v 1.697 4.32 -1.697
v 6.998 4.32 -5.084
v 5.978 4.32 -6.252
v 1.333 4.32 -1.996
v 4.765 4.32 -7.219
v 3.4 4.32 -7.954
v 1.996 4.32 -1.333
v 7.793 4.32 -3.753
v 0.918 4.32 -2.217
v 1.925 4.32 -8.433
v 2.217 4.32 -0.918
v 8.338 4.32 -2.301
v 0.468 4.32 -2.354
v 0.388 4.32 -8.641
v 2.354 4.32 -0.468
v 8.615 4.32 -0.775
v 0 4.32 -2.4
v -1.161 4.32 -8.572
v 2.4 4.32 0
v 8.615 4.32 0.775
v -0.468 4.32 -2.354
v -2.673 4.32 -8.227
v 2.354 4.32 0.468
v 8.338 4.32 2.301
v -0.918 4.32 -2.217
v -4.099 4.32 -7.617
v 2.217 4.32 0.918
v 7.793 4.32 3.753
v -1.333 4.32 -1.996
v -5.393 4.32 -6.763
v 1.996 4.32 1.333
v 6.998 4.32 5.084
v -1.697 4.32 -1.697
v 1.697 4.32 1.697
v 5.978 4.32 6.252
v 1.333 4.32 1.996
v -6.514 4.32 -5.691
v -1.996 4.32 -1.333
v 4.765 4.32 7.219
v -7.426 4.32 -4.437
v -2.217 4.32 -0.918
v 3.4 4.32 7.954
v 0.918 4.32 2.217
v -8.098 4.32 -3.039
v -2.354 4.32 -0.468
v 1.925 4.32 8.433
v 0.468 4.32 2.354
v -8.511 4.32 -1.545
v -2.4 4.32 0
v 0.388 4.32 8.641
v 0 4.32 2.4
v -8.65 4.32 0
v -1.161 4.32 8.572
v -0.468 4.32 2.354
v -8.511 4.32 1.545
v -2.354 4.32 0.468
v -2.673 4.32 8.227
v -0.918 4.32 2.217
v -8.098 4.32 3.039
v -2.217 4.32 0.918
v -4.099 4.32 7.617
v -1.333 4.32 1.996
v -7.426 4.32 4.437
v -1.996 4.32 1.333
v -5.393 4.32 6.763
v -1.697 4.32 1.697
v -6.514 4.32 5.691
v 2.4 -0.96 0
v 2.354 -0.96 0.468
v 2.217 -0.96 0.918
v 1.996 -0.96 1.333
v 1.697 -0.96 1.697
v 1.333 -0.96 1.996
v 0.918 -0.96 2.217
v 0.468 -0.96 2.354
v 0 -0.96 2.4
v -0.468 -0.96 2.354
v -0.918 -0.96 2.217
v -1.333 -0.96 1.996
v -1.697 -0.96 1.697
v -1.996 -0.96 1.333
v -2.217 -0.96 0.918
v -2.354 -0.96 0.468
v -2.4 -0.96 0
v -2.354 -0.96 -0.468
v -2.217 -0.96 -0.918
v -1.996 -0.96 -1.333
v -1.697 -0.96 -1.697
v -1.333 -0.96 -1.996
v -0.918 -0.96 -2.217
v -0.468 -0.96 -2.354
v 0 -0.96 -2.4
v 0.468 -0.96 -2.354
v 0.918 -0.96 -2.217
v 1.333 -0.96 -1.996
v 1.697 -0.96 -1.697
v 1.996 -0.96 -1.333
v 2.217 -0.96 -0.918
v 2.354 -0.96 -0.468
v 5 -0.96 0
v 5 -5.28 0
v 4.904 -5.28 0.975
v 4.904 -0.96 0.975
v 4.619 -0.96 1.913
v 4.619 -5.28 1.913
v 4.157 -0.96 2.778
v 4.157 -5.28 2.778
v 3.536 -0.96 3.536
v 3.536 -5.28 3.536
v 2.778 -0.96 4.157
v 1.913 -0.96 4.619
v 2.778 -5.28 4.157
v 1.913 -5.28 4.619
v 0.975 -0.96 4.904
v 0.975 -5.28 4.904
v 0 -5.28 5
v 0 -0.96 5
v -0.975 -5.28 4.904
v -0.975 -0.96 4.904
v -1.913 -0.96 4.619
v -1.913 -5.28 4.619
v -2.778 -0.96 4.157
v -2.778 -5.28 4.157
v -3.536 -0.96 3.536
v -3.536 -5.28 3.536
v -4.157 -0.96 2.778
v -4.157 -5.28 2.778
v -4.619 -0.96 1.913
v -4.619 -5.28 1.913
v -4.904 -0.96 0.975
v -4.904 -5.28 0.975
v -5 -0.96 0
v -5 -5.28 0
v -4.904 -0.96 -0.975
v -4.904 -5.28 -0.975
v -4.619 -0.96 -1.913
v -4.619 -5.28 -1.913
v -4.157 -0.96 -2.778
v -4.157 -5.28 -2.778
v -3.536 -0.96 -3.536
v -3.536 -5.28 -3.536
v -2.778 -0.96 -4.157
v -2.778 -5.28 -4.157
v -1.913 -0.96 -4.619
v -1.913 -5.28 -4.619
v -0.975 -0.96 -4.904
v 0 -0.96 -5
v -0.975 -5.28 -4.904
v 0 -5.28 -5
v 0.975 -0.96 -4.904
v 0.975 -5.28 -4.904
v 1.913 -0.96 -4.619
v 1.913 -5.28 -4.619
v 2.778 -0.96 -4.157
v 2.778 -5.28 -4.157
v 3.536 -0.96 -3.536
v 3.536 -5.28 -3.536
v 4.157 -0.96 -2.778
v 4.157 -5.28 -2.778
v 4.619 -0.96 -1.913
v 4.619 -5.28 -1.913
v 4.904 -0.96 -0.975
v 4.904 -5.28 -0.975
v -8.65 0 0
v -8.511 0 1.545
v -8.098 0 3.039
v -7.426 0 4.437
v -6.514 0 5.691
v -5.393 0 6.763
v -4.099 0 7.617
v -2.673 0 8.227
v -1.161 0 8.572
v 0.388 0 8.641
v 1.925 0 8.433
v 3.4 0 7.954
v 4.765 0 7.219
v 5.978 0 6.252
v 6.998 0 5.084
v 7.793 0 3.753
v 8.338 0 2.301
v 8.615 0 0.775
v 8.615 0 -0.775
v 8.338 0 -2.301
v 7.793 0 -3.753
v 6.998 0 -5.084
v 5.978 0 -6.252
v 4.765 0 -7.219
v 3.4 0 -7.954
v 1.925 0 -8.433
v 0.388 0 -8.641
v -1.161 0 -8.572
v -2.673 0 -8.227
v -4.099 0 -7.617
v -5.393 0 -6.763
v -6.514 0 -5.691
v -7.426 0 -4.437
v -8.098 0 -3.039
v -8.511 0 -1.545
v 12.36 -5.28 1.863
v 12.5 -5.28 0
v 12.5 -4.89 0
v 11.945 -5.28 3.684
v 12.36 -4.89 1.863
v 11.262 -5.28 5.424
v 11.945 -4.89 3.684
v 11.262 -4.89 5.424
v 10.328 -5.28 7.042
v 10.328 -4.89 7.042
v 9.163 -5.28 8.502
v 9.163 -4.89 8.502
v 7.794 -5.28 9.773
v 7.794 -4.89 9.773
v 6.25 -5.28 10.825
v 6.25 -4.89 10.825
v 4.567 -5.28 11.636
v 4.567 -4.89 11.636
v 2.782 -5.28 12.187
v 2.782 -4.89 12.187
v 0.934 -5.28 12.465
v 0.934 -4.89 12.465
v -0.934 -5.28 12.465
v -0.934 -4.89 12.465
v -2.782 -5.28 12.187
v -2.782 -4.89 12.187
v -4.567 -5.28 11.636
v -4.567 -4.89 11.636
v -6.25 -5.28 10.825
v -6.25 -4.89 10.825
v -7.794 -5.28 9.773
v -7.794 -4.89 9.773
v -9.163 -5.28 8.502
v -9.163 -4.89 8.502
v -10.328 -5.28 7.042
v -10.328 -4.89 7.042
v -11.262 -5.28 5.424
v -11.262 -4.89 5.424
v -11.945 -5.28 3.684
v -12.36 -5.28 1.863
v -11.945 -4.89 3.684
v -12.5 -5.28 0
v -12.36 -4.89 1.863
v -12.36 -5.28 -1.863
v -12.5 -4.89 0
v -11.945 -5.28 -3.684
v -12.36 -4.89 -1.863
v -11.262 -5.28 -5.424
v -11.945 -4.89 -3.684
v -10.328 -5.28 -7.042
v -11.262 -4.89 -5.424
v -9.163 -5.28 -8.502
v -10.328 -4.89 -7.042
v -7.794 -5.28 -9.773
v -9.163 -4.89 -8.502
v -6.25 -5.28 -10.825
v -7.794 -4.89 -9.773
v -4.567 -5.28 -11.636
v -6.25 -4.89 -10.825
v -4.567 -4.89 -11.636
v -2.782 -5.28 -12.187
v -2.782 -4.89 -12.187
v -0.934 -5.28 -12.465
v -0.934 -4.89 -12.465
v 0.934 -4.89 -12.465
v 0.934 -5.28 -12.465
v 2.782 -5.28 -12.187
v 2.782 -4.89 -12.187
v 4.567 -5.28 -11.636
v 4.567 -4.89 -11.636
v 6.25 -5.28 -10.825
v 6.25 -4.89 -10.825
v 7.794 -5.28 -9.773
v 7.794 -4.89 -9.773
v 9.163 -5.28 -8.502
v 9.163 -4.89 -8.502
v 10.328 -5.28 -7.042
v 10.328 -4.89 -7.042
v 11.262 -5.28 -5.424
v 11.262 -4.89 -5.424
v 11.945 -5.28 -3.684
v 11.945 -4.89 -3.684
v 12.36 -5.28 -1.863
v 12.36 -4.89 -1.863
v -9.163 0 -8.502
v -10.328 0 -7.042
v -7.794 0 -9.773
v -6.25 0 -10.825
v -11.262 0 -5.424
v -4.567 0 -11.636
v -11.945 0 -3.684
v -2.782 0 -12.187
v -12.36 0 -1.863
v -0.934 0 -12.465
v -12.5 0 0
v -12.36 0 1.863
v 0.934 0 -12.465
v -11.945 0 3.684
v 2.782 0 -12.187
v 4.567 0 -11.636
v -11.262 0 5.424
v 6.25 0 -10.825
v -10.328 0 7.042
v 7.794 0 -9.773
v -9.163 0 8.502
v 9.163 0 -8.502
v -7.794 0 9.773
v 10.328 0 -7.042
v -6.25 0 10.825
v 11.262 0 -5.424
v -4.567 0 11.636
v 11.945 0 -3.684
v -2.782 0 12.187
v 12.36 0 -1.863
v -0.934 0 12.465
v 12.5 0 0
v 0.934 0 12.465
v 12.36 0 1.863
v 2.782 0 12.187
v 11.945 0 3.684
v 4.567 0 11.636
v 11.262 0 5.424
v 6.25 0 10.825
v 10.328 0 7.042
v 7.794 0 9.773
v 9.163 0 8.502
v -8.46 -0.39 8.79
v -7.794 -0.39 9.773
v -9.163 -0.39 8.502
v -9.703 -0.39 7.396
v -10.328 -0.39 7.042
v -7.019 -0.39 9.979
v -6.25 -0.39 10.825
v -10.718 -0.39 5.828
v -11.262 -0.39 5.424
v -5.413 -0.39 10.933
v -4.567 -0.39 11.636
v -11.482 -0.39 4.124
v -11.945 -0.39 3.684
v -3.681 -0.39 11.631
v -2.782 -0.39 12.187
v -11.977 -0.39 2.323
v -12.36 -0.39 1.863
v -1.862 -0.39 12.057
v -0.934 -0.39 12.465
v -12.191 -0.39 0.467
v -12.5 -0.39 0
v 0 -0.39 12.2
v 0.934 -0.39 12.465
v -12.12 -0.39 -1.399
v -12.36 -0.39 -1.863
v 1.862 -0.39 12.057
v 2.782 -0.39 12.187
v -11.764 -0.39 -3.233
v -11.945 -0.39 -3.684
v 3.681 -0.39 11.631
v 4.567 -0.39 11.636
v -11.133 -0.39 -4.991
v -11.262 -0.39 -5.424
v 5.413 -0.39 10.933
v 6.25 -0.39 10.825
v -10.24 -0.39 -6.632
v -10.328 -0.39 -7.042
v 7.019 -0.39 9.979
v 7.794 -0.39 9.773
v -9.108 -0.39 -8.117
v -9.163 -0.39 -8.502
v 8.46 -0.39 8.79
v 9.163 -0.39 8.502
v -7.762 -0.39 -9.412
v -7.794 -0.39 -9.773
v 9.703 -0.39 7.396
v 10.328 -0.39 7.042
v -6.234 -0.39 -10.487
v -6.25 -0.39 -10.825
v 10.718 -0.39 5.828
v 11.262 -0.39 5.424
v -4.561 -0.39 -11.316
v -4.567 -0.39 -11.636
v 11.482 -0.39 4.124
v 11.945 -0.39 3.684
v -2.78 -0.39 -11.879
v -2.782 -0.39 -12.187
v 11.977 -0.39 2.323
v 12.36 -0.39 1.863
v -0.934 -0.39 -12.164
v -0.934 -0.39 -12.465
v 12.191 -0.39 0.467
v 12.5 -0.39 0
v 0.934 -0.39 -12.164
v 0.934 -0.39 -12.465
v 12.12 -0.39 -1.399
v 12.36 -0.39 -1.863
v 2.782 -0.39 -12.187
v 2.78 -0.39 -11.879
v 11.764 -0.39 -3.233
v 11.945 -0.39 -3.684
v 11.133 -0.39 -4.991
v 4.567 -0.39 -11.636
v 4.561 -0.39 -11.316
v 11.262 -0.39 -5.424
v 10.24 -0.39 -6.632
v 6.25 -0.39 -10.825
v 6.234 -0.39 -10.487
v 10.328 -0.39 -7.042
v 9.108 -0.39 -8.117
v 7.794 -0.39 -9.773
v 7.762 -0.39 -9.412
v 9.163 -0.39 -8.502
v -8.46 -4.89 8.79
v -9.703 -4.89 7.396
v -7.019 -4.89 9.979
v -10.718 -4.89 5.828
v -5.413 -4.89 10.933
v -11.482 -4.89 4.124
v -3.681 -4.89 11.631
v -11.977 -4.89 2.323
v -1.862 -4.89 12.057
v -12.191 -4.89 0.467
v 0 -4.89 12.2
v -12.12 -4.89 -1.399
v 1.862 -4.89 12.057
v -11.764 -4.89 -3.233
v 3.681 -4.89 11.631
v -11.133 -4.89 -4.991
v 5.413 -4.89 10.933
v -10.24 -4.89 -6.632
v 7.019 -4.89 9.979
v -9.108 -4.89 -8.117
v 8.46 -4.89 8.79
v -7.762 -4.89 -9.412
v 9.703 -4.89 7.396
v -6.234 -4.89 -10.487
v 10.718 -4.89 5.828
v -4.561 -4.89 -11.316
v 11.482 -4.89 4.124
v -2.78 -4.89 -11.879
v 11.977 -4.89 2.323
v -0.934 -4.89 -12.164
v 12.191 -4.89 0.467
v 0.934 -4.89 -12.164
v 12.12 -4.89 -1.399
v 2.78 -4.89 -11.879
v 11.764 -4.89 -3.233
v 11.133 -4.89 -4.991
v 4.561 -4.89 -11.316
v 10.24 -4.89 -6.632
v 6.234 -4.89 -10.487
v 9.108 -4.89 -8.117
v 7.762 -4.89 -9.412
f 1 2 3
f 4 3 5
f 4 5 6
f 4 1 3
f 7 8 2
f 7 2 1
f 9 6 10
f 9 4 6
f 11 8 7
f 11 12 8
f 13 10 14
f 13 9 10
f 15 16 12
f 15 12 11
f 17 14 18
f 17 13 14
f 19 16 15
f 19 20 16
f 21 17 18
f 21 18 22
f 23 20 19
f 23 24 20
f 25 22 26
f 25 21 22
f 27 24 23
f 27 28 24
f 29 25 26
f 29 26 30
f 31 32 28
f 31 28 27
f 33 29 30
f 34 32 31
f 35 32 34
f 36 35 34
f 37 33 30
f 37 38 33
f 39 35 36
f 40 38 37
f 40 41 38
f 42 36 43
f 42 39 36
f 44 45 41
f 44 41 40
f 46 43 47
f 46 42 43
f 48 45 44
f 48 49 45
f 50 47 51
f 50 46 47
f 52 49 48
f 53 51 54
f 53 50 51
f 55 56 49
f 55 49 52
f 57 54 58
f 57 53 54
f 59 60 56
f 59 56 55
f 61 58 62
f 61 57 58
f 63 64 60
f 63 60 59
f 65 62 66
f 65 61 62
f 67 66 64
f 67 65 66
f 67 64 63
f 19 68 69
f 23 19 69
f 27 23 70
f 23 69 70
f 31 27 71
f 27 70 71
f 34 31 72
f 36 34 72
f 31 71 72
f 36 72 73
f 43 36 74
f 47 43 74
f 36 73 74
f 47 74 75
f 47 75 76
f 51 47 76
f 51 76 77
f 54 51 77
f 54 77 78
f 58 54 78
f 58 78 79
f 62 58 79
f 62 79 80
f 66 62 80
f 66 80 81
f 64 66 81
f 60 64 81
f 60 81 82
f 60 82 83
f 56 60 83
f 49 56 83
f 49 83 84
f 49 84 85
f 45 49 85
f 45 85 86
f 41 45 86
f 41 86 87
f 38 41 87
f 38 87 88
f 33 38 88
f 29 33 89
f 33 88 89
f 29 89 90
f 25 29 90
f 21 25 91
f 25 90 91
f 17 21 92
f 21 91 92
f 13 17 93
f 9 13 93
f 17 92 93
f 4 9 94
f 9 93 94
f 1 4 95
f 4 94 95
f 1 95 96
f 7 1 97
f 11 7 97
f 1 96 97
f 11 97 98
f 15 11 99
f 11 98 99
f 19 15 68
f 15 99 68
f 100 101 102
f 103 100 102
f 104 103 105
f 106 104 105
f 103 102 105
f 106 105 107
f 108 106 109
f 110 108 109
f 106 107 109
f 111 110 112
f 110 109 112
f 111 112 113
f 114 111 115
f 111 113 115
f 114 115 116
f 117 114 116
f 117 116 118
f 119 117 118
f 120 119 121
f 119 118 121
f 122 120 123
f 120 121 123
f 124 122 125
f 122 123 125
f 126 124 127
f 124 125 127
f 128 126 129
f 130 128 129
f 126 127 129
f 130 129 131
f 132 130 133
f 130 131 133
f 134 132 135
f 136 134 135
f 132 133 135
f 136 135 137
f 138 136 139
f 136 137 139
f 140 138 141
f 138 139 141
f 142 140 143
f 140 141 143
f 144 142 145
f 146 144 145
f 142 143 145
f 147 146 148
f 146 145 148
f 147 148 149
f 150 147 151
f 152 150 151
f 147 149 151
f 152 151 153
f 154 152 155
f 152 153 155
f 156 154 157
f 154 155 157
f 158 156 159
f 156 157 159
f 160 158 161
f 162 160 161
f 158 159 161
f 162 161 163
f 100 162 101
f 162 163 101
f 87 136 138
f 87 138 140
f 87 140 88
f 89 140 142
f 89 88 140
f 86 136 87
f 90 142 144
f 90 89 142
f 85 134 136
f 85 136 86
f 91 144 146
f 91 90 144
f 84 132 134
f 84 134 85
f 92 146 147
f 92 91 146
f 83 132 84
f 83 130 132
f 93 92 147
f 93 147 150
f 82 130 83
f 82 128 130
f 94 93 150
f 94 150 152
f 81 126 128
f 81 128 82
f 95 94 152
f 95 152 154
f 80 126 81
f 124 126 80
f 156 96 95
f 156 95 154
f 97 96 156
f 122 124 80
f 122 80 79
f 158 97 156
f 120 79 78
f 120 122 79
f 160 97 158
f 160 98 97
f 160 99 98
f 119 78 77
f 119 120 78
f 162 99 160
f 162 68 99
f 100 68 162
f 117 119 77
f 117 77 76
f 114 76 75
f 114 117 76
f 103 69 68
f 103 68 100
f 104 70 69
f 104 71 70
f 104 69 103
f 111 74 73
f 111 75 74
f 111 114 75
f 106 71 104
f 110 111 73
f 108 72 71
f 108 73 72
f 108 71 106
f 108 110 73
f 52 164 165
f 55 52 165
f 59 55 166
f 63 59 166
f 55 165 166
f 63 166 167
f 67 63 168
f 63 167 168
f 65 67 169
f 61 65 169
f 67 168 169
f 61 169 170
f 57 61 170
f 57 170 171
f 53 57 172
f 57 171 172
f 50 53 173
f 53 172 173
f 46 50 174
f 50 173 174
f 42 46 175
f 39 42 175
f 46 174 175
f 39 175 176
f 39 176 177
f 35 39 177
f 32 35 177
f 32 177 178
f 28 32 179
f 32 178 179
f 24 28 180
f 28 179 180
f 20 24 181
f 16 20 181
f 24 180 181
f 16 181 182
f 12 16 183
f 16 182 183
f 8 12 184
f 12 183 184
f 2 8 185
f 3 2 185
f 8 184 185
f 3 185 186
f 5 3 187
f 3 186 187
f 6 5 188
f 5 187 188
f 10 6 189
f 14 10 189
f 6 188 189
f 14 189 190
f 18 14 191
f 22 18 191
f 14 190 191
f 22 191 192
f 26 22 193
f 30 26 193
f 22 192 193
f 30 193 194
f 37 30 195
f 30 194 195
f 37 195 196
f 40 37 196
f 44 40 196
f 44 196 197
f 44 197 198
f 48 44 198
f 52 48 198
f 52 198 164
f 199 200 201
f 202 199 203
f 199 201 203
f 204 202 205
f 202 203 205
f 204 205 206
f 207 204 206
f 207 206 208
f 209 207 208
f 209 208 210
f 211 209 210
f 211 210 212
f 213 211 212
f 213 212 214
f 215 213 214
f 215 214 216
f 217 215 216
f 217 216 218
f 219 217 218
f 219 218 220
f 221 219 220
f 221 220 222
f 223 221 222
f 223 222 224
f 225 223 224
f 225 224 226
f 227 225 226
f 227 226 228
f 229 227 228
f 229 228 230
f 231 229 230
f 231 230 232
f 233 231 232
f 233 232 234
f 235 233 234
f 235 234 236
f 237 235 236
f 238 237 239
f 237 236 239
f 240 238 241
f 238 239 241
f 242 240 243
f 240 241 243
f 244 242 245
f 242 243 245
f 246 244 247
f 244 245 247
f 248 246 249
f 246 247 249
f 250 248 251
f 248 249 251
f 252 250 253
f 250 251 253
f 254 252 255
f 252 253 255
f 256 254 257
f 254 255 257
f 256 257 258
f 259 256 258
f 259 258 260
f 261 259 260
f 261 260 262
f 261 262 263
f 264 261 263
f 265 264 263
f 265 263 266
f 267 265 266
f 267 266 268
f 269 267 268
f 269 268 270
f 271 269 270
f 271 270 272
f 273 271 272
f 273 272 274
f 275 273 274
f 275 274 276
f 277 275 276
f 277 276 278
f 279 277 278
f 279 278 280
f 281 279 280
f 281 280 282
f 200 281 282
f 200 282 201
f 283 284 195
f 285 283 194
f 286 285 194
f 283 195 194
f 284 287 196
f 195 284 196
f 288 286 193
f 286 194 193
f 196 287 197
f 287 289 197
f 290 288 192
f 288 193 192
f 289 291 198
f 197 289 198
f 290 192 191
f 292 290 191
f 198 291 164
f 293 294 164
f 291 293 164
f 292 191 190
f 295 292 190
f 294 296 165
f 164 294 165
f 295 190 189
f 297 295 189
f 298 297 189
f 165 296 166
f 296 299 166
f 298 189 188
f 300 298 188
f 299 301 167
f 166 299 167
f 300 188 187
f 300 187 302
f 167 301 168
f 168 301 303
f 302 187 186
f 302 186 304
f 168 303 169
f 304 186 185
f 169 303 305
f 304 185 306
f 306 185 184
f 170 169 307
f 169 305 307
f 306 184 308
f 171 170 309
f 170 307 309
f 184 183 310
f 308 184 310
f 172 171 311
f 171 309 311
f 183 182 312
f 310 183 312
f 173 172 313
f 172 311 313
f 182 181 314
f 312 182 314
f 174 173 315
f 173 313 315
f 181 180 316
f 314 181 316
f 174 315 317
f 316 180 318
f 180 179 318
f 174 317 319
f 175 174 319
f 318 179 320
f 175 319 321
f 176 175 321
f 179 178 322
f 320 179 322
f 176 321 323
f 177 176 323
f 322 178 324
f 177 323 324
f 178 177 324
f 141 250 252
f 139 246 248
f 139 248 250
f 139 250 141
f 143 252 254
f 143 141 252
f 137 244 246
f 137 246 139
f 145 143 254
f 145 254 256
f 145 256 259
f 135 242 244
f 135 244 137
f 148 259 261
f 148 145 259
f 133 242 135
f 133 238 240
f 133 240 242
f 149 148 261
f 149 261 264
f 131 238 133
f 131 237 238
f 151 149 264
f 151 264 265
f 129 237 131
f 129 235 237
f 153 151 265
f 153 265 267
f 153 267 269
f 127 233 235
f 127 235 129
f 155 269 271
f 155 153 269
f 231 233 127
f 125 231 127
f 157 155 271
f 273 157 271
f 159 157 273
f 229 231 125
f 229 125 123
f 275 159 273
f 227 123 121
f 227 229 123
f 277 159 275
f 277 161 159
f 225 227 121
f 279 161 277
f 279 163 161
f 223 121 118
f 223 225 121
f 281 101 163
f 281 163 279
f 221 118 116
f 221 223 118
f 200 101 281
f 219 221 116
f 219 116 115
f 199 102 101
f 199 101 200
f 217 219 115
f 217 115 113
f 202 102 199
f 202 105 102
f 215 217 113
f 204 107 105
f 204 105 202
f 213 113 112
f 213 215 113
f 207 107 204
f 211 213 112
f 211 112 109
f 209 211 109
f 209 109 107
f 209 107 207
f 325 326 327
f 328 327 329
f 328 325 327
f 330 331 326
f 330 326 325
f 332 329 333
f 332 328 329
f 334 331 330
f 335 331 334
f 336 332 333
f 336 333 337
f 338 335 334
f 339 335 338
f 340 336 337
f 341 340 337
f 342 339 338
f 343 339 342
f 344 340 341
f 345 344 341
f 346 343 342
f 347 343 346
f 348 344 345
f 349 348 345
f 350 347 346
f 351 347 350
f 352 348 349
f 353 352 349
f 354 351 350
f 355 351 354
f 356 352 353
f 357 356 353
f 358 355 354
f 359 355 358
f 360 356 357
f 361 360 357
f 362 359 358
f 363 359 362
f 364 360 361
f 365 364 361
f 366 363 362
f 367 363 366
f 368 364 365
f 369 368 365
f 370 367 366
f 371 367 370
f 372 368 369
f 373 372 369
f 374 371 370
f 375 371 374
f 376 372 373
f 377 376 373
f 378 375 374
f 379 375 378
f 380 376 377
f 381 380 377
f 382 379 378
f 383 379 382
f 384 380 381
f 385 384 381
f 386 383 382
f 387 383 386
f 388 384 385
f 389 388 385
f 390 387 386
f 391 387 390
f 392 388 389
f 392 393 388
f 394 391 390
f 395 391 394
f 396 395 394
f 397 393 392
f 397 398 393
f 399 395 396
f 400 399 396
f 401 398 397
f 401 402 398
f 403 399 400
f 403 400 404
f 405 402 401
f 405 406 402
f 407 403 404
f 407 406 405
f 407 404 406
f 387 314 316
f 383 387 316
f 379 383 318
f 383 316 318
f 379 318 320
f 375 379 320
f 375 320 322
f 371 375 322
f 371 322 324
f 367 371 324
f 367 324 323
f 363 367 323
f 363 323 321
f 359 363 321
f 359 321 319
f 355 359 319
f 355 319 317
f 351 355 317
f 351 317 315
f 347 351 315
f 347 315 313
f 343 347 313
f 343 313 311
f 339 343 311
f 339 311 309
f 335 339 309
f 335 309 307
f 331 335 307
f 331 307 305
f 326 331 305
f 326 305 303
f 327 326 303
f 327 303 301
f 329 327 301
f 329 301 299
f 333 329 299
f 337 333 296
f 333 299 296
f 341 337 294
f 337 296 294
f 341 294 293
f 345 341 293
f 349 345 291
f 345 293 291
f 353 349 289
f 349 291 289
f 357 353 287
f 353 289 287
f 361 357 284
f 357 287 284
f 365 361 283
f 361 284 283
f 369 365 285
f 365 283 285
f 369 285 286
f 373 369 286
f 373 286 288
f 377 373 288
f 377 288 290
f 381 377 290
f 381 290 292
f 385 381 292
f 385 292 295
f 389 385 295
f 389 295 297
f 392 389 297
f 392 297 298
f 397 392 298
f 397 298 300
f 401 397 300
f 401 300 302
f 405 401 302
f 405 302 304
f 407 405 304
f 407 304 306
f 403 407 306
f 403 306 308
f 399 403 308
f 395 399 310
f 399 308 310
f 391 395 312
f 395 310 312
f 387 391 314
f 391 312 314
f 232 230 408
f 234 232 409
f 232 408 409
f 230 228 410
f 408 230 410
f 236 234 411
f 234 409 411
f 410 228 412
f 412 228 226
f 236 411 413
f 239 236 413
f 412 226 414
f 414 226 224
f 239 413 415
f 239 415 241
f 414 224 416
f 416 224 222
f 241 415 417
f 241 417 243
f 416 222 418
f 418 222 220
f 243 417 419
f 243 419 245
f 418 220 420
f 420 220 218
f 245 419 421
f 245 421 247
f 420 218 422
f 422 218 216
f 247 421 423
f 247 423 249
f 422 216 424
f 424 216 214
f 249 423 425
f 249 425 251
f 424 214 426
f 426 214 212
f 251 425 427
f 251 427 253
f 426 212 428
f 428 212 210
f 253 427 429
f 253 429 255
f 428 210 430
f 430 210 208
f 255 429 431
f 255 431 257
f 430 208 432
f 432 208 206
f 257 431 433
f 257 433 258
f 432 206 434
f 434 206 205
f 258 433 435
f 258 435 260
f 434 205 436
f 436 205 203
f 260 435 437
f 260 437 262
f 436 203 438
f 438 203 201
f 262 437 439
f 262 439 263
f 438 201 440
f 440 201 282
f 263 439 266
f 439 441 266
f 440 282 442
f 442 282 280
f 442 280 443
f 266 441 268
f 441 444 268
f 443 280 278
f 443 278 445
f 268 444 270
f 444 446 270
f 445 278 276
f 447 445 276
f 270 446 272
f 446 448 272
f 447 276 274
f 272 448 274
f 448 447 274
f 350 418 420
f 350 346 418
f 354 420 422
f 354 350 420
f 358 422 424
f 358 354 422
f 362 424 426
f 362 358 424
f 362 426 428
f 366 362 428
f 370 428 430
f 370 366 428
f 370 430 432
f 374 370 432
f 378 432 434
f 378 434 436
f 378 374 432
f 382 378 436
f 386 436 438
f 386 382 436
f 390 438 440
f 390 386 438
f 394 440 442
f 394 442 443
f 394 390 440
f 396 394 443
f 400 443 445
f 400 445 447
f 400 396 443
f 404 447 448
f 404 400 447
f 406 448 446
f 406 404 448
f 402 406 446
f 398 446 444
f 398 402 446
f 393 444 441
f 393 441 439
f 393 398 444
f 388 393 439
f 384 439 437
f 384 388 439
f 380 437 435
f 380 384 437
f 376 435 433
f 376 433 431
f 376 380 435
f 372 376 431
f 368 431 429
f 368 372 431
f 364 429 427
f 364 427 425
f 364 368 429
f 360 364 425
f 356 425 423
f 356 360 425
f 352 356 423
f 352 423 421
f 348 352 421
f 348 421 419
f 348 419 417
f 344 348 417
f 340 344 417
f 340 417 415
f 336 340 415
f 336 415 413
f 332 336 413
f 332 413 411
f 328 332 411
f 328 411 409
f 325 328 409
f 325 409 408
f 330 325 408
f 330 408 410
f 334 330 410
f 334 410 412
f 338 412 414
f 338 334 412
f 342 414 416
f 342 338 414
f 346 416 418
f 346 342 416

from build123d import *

# Parameters (mm, degrees)
F0_R     = 12.5
F1_DEPTH = 5.28
F2_R     = 8.65
F3_DEPTH = 4.32
F4_R     = 5
F5_DEPTH = 4.32
F6_W     = 4.5
F6_H     = 0.3
F8_R     = 2.4
F9_DEPTH = 25


with BuildPart() as f1:
    # F0 (on Front) → F1 (new body)
    with BuildSketch(Plane.XZ):
        Circle(F0_R)
    extrude(amount=F1_DEPTH)

    # F2 (on face) → F3 (join)
    with BuildSketch(Plane(origin=(0, 0, 0), x_dir=(-1, 0, 0), z_dir=(0, 1, 0))):
        Circle(F2_R)
    extrude(amount=F3_DEPTH)

    # F4 (on face) → F5 (cut)
    with BuildSketch(Plane.XZ.offset(5.28)):
        Circle(F4_R)
    extrude(amount=-F5_DEPTH, mode=Mode.SUBTRACT)

    # F6 (on Right) → F7 (revolve, cut)
    with BuildSketch(Plane.YZ):
        with Locations((-2.64, 12.35)):
            Rectangle(F6_W, F6_H)
    revolve(axis=Axis((0, 0, 0), (0, 1, 0)), mode=Mode.SUBTRACT)

    # F8 (on face) → F9 (cut)
    with BuildSketch(Plane.XZ.offset(0.96)):
        Circle(F8_R)
    extrude(amount=-F9_DEPTH, mode=Mode.SUBTRACT)


solid = f1.part
